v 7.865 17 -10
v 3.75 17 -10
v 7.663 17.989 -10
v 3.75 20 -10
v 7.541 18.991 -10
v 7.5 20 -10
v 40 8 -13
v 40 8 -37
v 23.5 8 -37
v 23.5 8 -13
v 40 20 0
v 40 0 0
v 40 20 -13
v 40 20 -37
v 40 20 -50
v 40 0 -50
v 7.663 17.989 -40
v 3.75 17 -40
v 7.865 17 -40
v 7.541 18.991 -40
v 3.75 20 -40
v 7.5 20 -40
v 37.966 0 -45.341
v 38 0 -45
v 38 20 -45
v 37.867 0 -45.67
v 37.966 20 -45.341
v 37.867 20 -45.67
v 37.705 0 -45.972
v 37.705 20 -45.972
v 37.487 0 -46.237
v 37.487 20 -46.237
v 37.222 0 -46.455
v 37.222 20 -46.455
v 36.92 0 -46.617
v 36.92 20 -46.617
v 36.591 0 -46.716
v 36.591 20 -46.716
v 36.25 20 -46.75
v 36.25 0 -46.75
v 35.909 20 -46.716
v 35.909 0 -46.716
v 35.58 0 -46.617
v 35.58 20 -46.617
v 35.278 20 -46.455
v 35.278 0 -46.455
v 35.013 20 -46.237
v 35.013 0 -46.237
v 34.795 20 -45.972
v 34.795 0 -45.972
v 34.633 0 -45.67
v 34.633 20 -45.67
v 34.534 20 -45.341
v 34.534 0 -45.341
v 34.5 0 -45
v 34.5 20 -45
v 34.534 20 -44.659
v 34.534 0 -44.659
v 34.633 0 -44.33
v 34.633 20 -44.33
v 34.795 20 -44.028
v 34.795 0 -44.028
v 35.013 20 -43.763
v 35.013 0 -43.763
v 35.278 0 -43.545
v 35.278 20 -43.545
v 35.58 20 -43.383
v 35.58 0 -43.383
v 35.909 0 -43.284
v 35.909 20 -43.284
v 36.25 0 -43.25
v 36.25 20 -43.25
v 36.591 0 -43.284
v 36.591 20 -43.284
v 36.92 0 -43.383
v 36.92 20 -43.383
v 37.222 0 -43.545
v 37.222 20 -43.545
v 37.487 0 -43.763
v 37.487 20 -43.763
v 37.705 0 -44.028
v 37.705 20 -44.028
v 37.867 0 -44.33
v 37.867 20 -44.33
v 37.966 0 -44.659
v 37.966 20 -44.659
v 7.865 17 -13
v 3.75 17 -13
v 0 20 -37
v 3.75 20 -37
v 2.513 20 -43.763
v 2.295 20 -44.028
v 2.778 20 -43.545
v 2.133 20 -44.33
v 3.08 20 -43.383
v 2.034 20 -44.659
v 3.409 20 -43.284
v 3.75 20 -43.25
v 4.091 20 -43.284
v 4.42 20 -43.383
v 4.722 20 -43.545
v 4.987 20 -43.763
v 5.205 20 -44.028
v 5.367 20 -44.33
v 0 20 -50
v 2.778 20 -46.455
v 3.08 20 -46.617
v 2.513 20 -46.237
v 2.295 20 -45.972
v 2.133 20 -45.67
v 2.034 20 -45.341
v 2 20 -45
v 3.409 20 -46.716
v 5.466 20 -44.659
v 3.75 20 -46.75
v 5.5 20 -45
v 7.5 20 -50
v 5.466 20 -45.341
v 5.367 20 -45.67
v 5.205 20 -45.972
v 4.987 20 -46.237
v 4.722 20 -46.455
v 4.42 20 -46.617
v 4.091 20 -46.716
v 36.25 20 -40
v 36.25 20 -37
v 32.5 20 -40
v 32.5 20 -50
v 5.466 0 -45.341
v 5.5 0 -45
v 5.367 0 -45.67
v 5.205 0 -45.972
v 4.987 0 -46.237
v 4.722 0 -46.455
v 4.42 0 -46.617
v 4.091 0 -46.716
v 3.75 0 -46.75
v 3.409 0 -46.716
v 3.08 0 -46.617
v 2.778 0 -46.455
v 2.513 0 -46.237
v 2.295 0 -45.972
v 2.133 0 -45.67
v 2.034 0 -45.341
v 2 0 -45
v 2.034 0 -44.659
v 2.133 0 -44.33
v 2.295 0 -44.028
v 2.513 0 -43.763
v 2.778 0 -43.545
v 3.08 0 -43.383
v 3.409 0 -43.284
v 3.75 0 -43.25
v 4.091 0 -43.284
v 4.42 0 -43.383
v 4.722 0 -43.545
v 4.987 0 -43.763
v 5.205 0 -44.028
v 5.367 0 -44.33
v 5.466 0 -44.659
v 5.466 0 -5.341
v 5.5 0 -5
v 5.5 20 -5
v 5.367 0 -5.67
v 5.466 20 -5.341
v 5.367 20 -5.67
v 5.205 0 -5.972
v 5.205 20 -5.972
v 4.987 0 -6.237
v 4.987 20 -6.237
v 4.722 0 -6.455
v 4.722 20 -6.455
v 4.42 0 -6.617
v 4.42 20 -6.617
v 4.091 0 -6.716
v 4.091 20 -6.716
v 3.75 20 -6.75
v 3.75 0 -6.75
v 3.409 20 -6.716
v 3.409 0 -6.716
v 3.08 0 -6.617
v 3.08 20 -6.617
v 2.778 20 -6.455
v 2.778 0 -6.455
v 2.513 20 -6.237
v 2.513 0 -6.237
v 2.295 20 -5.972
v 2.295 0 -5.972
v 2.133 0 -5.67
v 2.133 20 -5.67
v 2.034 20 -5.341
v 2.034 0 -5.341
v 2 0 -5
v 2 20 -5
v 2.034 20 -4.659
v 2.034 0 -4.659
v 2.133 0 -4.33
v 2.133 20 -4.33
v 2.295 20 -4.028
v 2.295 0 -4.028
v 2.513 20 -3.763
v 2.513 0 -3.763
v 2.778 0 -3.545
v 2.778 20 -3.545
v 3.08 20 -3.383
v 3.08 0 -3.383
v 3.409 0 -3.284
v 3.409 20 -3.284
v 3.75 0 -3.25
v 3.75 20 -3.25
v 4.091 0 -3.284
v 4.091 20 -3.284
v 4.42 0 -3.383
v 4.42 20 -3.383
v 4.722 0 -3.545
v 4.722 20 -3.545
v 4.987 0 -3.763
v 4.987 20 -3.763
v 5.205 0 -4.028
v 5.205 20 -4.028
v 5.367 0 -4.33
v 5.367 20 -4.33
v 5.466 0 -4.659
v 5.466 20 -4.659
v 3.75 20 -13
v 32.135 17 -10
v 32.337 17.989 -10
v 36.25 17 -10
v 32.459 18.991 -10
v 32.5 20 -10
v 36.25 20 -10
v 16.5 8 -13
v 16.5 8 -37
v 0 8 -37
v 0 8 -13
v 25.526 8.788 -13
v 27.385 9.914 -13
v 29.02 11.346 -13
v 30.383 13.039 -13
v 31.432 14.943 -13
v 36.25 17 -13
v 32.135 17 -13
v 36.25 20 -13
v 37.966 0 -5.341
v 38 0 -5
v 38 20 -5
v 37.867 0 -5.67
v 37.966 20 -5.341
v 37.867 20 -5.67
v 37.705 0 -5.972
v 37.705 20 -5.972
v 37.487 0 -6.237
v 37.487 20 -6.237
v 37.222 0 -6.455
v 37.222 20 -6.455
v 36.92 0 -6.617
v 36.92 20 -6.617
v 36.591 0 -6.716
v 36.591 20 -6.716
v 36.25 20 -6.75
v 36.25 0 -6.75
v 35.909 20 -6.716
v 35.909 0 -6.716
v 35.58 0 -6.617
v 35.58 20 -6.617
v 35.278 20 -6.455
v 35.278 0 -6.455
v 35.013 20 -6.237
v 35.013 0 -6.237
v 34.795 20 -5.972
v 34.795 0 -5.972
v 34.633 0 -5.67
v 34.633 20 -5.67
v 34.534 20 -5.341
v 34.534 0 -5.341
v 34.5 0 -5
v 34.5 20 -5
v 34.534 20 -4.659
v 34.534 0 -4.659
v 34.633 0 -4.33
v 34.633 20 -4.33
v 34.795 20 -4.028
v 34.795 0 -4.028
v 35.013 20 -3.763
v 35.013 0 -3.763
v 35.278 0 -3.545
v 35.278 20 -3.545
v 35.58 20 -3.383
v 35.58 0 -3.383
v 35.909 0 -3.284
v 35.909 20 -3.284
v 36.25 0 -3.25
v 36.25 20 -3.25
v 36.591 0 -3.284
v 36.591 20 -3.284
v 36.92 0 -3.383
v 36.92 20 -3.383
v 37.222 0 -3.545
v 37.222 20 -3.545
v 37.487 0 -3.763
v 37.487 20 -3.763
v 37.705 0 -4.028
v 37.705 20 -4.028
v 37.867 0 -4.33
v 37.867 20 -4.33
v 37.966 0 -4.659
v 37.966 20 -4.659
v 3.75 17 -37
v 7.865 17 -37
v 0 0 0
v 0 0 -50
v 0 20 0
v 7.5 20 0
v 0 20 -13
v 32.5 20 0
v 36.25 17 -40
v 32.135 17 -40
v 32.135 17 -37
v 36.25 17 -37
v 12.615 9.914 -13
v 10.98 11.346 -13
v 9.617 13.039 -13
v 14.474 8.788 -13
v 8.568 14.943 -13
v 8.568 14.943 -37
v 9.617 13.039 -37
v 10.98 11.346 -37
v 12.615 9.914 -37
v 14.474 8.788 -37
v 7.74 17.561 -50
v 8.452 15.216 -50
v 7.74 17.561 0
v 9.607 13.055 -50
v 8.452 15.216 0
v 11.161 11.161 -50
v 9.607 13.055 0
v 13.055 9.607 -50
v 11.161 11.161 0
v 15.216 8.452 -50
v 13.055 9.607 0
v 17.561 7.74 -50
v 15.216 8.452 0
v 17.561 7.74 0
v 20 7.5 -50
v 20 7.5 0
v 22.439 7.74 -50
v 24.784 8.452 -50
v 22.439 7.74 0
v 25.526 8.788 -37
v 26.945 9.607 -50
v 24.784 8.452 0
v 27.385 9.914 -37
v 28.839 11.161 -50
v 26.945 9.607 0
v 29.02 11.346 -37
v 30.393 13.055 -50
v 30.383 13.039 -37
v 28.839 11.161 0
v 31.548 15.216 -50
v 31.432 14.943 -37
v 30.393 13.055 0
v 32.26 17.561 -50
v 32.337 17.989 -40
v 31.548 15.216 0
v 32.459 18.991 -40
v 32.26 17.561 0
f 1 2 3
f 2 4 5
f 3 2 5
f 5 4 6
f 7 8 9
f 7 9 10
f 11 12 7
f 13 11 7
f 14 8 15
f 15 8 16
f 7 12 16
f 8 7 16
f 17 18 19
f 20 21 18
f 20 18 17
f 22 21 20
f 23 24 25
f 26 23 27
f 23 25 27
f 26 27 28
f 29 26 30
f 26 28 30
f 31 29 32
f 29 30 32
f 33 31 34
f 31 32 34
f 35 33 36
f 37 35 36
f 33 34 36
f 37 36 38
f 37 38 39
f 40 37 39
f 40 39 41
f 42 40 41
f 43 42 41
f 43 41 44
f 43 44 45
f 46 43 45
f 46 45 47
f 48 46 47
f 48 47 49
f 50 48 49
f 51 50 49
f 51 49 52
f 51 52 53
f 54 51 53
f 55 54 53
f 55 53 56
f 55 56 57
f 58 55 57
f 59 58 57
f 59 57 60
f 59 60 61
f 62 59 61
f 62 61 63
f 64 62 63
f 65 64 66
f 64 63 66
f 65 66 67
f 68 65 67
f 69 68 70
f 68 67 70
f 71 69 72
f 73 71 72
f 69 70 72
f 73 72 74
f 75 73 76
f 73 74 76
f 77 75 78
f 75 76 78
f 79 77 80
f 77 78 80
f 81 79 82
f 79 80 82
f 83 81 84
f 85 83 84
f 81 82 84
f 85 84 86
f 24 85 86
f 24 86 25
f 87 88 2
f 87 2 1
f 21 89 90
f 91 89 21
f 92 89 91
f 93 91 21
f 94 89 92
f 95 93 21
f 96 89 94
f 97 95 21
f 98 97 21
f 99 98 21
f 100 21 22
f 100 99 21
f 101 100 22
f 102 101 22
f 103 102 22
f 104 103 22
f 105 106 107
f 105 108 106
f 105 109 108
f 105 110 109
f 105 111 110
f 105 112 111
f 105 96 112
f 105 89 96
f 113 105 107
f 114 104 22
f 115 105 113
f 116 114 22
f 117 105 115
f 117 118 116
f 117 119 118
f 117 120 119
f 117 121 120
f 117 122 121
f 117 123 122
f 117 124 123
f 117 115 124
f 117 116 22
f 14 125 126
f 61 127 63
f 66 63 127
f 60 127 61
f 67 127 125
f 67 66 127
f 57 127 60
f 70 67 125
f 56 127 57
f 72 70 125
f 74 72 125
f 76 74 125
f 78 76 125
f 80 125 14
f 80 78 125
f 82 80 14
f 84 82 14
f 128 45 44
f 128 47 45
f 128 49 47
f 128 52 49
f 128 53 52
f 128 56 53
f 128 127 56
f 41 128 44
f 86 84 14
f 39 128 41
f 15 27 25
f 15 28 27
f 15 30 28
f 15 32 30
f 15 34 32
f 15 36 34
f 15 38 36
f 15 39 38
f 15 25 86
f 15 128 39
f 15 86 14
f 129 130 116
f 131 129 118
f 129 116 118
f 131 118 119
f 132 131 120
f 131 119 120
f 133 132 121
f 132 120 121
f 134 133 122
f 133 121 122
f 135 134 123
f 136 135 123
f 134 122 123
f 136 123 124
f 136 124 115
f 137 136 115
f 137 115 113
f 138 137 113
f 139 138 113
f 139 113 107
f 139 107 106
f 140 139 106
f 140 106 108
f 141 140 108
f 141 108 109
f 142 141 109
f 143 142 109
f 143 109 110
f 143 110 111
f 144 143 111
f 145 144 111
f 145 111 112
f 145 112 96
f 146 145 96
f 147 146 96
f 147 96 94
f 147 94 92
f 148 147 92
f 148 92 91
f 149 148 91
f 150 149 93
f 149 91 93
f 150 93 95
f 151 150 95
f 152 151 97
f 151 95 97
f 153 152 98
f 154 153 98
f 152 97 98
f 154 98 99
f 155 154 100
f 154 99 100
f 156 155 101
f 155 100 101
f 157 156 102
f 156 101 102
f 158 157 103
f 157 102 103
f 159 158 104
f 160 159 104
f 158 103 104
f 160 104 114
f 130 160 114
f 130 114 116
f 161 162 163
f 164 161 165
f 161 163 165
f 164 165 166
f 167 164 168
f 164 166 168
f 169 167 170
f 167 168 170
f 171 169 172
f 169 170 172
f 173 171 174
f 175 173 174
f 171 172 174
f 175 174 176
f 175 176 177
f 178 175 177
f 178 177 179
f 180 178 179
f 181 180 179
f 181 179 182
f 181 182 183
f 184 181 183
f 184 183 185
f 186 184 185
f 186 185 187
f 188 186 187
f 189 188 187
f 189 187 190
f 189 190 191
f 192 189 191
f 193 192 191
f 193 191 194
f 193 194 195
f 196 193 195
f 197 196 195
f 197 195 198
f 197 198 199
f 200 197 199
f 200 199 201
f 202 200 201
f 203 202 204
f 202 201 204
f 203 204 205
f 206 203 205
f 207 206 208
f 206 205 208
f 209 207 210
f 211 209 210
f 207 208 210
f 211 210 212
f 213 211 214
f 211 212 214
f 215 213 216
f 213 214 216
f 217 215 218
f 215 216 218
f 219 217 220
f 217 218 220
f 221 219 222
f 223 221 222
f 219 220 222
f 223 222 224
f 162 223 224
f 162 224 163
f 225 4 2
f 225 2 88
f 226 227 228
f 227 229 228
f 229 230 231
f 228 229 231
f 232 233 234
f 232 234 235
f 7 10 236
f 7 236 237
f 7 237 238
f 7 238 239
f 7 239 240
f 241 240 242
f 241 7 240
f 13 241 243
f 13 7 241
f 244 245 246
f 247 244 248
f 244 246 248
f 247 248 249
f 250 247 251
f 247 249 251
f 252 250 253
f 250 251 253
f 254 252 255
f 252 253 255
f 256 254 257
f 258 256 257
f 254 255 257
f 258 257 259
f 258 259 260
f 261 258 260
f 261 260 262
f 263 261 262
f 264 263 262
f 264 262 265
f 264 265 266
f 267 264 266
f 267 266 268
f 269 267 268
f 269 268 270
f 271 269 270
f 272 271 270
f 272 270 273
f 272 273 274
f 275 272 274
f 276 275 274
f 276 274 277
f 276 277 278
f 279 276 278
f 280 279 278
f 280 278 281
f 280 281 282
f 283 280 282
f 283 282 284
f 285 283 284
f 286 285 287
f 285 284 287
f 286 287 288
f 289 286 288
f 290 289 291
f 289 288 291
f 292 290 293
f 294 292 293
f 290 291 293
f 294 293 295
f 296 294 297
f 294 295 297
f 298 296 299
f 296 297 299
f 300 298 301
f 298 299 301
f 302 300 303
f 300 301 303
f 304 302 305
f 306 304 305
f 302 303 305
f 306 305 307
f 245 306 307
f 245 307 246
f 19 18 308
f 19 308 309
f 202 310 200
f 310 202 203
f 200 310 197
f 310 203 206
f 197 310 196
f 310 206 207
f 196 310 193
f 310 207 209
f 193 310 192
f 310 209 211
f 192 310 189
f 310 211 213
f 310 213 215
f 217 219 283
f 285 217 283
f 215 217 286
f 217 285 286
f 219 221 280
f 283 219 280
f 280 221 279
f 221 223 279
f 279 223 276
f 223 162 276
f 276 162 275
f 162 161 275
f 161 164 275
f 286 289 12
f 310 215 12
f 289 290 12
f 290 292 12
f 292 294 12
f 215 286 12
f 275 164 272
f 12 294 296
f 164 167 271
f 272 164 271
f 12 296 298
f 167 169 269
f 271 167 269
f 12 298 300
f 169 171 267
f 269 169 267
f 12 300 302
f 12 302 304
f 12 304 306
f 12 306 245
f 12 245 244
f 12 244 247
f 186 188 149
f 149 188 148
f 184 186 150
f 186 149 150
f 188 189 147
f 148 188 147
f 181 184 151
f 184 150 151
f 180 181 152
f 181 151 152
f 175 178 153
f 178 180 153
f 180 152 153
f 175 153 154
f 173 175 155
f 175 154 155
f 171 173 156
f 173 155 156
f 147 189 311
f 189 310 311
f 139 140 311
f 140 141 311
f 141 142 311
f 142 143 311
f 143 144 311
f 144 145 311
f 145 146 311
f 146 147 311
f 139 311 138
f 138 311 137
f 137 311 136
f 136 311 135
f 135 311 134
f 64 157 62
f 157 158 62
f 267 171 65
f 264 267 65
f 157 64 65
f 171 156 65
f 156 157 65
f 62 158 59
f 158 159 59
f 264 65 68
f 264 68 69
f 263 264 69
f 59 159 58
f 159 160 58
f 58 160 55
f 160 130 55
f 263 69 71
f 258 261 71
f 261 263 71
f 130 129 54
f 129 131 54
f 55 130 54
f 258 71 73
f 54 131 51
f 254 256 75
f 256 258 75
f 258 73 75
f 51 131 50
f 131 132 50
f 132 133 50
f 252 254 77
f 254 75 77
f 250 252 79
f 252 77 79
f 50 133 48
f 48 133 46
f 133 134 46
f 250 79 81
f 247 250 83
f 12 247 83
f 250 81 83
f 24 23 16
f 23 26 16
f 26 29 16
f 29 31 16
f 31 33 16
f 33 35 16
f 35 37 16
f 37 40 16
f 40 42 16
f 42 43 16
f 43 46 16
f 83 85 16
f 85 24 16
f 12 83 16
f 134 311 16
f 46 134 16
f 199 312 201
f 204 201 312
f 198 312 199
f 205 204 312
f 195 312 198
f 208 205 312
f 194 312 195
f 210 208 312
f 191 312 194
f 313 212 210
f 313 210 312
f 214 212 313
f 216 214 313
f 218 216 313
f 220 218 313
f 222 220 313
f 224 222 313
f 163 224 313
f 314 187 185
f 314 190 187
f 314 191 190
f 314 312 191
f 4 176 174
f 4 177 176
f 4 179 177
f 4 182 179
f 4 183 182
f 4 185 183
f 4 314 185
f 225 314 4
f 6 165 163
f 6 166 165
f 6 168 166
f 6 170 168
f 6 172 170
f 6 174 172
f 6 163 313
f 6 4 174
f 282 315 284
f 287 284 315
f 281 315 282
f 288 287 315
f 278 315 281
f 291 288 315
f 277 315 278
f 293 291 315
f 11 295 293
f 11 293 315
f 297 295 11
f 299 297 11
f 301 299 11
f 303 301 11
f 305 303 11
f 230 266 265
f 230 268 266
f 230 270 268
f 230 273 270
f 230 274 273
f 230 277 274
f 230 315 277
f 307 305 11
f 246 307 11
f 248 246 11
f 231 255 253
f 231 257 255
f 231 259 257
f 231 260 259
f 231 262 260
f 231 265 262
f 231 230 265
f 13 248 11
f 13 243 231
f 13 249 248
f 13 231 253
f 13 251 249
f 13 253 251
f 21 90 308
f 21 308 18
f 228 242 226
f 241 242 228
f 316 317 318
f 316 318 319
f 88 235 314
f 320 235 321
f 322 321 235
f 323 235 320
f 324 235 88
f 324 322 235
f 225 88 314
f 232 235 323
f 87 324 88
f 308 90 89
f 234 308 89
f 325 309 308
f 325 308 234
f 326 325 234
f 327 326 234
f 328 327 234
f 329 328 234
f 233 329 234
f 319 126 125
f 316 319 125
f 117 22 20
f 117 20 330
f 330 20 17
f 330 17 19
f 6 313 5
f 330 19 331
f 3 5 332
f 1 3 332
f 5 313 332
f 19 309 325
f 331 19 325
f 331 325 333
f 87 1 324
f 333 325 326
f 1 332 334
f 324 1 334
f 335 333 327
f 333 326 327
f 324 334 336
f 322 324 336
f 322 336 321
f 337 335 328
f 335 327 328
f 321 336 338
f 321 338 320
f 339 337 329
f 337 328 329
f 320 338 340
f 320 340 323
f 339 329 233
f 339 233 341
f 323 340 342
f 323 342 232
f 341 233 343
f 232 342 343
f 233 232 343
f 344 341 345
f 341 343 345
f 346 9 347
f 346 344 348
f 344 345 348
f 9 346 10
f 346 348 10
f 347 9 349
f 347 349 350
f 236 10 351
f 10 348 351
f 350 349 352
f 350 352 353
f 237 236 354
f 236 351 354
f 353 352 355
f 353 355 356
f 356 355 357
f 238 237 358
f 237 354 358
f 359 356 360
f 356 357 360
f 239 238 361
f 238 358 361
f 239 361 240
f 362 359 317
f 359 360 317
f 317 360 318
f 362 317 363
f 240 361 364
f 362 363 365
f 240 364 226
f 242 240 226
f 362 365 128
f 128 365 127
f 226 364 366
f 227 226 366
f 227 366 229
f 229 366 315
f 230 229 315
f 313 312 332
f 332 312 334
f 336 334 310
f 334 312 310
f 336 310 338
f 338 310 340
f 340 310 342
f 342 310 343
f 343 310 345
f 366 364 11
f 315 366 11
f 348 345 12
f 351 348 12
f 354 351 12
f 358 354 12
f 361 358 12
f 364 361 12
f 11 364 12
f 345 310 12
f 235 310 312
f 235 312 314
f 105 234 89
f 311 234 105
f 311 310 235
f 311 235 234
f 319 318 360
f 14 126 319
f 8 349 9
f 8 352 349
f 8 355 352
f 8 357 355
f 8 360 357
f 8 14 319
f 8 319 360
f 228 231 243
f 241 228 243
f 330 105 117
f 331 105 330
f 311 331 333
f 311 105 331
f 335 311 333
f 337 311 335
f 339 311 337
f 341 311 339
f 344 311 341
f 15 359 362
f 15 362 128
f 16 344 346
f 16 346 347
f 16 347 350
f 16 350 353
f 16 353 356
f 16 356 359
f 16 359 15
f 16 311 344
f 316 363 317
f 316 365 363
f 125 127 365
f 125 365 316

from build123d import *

# Parameters (mm, degrees)
CROQUIS1_W              = 40
CROQUIS1_H              = 50
SALIENTE_EXTRUIR1_DEPTH = 20
CROQUIS2_R              = 12.5
CORTAR_EXTRUIR1_DEPTH   = 51
CROQUIS3_R              = 1.75
CORTAR_EXTRUIR2_DEPTH   = 21
CORTAR_EXTRUIR3_DEPTH   = 41
CROQUIS5_W              = 5
CROQUIS5_H              = 3
CORTAR_EXTRUIR4_DEPTH   = 3


with BuildPart() as part:
    # Croquis1 → Saliente-Extruir1 (new body)
    with BuildSketch(Plane(origin=(0, 0, 0), x_dir=(1, 0, 0), z_dir=(0, 1, 0))):
        with Locations((20, 25)):
            Rectangle(CROQUIS1_W, CROQUIS1_H)
    extrude(amount=SALIENTE_EXTRUIR1_DEPTH)

    # Croquis2 → Cortar-Extruir1 (cut, through all)
    with BuildSketch(Plane.XY):
        with Locations((20, 20)):
            Circle(CROQUIS2_R)
    extrude(amount=-CORTAR_EXTRUIR1_DEPTH, mode=Mode.SUBTRACT)

    # Croquis3 → Cortar-Extruir2 (cut, through all)
    with BuildSketch(Plane(origin=(0, 20, 0), x_dir=(1, 0, 0), z_dir=(0, 1, 0))):
        with Locations((3.75, 45)):
            Circle(CROQUIS3_R)
        with Locations((36.25, 45)):
            Circle(CROQUIS3_R)
        with Locations((36.25, 5)):
            Circle(CROQUIS3_R)
        with Locations((3.75, 5)):
            Circle(CROQUIS3_R)
    extrude(amount=-CORTAR_EXTRUIR2_DEPTH, mode=Mode.SUBTRACT)

    # Croquis4 → Cortar-Extruir3 (cut, through all)
    with BuildSketch(Plane(origin=(40, 0, 0), x_dir=(0, 0, -1), z_dir=(1, 0, 0))):
        Polygon((25, 20), (37, 20), (37, 8), (13, 8), (13, 20), align=None)
    extrude(amount=-CORTAR_EXTRUIR3_DEPTH, mode=Mode.SUBTRACT)

    # Croquis5 → Cortar-Extruir4 (cut)
    with BuildSketch(Plane(origin=(0, 20, 0), x_dir=(1, 0, 0), z_dir=(0, 1, 0))):
        with Locations((6.25, 38.5)):
            Rectangle(CROQUIS5_W, CROQUIS5_H)
        with Locations((33.75, 38.5)):
            Rectangle(CROQUIS5_W, CROQUIS5_H)
        with Locations((33.75, 11.5)):
            Rectangle(CROQUIS5_W, CROQUIS5_H)
        with Locations((6.25, 11.5)):
            Rectangle(CROQUIS5_W, CROQUIS5_H)
    extrude(amount=-CORTAR_EXTRUIR4_DEPTH, mode=Mode.SUBTRACT)


solid = part.part
